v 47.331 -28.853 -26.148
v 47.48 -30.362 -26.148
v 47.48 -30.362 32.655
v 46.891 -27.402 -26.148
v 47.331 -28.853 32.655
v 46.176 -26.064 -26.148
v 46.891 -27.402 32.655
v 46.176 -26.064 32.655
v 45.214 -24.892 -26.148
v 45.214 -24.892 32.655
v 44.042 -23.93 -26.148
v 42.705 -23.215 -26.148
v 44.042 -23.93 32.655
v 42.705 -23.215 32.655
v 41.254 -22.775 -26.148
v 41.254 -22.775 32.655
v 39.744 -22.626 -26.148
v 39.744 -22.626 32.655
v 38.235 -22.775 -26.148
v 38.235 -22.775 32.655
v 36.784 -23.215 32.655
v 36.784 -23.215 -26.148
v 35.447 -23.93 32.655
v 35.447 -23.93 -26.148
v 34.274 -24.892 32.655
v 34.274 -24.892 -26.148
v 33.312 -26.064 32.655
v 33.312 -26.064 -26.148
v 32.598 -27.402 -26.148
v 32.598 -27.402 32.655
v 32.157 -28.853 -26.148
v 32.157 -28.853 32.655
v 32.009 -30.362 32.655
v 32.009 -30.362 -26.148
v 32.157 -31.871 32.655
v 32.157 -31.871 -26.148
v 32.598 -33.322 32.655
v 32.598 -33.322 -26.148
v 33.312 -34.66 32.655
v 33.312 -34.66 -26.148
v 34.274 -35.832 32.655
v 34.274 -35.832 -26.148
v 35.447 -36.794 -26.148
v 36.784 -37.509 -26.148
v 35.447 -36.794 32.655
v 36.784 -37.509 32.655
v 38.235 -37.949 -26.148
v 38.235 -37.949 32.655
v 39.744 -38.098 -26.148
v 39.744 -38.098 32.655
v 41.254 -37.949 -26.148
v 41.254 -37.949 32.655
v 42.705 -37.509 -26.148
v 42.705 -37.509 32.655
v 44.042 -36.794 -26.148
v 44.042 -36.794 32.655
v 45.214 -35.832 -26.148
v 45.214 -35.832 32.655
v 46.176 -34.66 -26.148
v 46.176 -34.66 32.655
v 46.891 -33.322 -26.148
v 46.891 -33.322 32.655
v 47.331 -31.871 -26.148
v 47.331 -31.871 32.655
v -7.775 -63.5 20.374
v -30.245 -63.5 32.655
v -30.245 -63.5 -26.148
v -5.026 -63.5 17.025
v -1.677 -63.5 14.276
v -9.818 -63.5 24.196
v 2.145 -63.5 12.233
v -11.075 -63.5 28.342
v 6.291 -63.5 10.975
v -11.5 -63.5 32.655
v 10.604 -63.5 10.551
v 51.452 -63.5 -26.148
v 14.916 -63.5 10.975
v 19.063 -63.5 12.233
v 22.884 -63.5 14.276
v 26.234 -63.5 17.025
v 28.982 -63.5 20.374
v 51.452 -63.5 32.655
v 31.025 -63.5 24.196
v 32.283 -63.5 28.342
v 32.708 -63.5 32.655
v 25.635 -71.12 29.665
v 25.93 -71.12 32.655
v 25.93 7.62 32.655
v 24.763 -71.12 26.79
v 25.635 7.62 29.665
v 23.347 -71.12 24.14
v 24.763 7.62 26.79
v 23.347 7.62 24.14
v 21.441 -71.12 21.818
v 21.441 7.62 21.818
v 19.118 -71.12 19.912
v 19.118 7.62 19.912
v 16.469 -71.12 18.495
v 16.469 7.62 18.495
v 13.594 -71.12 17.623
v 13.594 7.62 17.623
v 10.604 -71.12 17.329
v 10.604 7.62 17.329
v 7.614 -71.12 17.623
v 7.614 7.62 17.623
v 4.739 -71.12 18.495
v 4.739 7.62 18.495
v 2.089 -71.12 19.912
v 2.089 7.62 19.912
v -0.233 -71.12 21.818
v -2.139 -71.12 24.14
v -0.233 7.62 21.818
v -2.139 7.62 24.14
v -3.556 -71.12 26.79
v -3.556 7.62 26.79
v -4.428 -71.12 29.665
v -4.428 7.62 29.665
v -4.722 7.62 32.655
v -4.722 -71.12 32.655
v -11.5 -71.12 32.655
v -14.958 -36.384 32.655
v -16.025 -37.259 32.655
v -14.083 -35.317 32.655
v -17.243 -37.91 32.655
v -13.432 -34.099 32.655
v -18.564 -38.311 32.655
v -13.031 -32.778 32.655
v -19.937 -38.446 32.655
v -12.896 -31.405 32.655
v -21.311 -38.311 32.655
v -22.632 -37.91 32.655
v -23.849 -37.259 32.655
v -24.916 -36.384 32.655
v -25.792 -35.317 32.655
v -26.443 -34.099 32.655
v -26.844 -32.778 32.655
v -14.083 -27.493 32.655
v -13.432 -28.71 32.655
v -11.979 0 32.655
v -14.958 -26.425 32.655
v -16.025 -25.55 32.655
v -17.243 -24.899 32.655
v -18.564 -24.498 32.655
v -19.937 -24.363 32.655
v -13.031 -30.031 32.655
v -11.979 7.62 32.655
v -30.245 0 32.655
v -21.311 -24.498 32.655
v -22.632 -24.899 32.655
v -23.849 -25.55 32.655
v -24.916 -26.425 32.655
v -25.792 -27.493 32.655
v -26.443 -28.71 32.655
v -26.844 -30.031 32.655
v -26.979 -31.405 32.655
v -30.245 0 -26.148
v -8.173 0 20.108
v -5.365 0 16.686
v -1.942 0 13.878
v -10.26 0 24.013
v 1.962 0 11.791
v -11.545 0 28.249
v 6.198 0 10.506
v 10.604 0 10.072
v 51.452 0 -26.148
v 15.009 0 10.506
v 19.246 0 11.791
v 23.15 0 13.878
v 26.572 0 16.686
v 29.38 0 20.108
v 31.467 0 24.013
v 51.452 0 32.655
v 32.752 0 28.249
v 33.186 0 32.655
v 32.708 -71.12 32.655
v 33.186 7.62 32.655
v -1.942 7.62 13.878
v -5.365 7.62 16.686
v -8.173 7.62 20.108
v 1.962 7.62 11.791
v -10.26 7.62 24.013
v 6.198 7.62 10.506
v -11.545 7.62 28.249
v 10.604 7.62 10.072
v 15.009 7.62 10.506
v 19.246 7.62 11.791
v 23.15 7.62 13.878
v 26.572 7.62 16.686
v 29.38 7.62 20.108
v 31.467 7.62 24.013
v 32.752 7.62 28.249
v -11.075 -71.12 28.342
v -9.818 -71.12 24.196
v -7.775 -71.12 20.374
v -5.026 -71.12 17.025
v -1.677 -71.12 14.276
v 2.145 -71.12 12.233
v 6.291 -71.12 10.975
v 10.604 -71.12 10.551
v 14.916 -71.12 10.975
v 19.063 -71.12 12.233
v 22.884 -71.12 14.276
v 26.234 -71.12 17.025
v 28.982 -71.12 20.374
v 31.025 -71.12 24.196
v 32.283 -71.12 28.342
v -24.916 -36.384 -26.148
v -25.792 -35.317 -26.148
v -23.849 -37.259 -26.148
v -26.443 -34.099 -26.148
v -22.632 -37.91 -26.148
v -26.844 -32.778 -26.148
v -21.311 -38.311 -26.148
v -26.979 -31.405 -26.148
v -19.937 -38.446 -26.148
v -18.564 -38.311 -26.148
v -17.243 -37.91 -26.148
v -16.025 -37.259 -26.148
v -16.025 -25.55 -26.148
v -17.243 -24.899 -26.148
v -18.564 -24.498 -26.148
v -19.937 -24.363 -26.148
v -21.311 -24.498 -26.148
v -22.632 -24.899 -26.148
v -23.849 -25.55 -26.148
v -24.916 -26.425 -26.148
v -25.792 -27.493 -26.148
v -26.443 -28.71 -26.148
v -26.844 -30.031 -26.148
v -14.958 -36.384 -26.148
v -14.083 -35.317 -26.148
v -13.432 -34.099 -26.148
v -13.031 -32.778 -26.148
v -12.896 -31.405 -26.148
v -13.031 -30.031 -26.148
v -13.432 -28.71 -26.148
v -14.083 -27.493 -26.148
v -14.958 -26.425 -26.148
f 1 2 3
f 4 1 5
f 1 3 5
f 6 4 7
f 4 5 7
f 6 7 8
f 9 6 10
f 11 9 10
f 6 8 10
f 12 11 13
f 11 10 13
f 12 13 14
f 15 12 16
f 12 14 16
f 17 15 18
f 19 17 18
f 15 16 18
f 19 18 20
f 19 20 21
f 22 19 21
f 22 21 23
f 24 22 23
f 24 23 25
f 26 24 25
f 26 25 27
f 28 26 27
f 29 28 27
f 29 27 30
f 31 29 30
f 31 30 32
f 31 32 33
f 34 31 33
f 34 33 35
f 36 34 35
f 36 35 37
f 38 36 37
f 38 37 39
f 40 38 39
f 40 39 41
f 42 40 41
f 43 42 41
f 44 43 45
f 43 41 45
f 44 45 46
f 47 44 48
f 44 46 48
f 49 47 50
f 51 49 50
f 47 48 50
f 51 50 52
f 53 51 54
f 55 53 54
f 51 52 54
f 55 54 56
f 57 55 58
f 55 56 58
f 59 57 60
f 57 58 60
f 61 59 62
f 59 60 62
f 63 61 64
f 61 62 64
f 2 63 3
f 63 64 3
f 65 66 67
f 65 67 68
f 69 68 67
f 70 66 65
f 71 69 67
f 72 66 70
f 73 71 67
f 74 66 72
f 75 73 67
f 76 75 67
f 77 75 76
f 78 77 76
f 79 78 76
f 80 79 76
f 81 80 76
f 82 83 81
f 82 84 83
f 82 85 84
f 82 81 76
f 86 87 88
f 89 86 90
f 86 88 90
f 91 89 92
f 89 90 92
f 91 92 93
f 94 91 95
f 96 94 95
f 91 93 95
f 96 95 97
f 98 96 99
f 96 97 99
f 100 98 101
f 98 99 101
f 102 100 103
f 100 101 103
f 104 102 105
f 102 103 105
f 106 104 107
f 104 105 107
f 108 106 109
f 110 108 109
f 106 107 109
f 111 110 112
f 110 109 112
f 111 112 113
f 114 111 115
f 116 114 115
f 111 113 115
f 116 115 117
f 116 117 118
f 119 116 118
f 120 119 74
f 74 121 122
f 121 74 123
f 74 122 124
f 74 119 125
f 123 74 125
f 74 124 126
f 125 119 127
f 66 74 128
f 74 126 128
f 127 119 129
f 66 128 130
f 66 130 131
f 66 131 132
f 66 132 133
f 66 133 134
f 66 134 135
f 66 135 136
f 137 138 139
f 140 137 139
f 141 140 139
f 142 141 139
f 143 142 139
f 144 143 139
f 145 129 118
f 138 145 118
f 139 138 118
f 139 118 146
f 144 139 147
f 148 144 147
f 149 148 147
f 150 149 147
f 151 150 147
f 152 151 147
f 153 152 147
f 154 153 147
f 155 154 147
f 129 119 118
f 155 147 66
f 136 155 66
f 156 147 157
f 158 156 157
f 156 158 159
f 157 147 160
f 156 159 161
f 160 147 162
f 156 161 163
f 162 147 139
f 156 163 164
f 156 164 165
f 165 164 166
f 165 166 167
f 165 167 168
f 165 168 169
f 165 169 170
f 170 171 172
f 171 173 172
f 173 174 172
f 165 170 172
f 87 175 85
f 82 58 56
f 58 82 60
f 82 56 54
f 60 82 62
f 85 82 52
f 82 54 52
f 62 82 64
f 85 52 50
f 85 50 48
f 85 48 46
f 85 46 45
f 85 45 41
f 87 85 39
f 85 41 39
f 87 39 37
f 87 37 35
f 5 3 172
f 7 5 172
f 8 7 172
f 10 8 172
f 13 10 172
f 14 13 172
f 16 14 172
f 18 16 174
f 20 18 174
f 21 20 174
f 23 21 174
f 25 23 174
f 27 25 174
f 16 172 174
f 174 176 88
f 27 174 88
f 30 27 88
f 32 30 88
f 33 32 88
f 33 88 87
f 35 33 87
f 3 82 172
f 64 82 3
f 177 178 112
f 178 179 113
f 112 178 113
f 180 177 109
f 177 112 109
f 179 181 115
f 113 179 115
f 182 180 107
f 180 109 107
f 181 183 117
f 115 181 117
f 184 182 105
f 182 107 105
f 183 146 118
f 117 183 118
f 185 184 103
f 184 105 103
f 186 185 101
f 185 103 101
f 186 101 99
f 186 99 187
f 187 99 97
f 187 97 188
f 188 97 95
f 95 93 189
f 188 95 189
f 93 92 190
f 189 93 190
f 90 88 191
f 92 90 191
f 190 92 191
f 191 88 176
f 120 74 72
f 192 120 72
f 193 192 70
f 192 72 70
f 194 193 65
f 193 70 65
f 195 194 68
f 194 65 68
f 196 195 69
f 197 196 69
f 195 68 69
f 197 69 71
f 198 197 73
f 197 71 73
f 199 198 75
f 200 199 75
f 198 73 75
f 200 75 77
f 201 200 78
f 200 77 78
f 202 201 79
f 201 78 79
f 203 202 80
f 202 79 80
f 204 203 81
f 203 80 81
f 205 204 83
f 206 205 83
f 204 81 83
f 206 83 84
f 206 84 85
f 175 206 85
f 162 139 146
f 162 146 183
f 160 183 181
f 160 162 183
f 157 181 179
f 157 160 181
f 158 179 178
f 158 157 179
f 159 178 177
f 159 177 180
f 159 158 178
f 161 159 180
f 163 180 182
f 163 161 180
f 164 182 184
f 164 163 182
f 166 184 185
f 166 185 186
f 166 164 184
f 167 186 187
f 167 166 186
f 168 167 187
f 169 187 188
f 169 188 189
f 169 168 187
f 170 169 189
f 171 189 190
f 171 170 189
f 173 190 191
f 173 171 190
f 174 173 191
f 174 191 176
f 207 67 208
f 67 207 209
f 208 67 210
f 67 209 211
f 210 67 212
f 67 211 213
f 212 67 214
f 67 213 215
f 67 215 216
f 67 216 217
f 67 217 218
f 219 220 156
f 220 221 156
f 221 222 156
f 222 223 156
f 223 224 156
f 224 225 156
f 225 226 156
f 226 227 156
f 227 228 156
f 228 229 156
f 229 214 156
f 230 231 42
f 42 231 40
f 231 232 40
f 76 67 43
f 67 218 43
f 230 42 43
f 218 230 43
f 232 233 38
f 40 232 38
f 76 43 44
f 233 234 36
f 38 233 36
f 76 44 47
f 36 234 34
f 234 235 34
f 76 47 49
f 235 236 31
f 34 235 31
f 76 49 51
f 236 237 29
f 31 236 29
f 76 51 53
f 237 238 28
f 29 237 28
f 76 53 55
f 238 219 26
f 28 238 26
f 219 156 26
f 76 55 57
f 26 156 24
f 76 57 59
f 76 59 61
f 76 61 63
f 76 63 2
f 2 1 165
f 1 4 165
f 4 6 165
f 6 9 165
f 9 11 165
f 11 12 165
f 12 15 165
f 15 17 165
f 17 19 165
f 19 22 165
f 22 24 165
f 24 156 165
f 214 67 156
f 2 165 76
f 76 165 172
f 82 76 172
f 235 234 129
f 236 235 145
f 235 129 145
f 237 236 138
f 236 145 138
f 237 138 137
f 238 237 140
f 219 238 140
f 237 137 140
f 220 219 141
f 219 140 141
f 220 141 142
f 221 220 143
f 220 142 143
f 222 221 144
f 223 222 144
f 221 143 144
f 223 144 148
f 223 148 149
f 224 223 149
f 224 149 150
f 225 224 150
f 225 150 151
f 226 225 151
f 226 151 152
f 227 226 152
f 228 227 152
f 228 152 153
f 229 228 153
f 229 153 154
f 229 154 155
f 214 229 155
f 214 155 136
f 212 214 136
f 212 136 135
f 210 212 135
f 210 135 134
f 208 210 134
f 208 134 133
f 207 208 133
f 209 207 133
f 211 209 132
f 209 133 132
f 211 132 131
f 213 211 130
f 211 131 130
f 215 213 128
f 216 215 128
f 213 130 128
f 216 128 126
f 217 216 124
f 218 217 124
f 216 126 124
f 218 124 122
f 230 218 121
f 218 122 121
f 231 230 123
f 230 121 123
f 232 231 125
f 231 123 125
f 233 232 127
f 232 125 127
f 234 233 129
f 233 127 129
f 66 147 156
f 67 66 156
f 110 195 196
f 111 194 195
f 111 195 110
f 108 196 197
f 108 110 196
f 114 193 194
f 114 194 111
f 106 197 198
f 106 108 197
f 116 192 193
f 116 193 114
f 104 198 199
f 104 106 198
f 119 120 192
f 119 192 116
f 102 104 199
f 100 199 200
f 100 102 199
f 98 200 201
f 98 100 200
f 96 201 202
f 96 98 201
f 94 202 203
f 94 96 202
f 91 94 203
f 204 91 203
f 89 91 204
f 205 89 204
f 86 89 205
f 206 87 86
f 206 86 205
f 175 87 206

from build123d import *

# Parameters (mm, degrees)
F1_DEPTH = 63.5
F2_DEPTH = 7.62
F4_DEPTH = 7.62
F5_R     = 7.735602
F6_DEPTH = 73.152
F5_R_2   = 7.041534
F7_DEPTH = 76.2


with BuildPart() as f1:
    # F0 (on Front) → F1 (new body)
    with BuildSketch(Plane.XZ):
        with BuildLine():
            Line((-11.978863, 32.654684), (-30.244743, 32.654684))
            Line((-30.244743, 32.654684), (-30.244743, -26.147846))
            Line((-30.244743, -26.147846), (51.452216, -26.147846))
            Line((51.452216, -26.147846), (51.452216, 32.654684))
            Line((51.452216, 32.654684), (33.186335, 32.654684))
            ThreePointArc((33.186335, 32.654684), (10.603736, 10.072085), (-11.978863, 32.654684))
        make_face()
        with BuildLine():
            Line((-4.722234, 32.654684), (-11.978863, 32.654684))
            ThreePointArc((-11.978863, 32.654684), (10.603736, 10.072085), (33.186335, 32.654684))
            Line((33.186335, 32.654684), (25.929707, 32.654684))
            ThreePointArc((25.929707, 32.654684), (10.603736, 17.328714), (-4.722234, 32.654684))
        make_face()
    extrude(amount=F1_DEPTH)

    # F0 (on Front) → F2 (join)
    with BuildSketch(Plane.XZ):
        with BuildLine():
            Line((-4.722234, 32.654684), (-11.978863, 32.654684))
            ThreePointArc((-11.978863, 32.654684), (10.603736, 10.072085), (33.186335, 32.654684))
            Line((33.186335, 32.654684), (25.929707, 32.654684))
            ThreePointArc((25.929707, 32.654684), (10.603736, 17.328714), (-4.722234, 32.654684))
        make_face()
    extrude(amount=-F2_DEPTH)

    # F3 (on face) → F4 (join)
    with BuildSketch(Plane.XZ.offset(63.5)):
        with BuildLine():
            ThreePointArc((-11.5002, 32.654684), (10.603736, 10.550748), (32.707673, 32.654684))
            Line((32.707673, 32.654684), (25.929707, 32.654684))
            ThreePointArc((25.929707, 32.654684), (10.603736, 17.328714), (-4.722234, 32.654684))
            Line((-4.722234, 32.654684), (-11.5002, 32.654684))
        make_face()
    extrude(amount=F4_DEPTH)

    # F5 (on face) → F6 (cut)
    with BuildSketch(Plane.XY.offset(32.654684)):
        with Locations((39.744381, -30.362099)):
            Circle(F5_R)
    extrude(amount=-F6_DEPTH, mode=Mode.SUBTRACT)

    # F5 (on face) → F7 (cut)
    with BuildSketch(Plane.XY.offset(32.654684)):
        with Locations((-19.937346, -31.404577)):
            Circle(F5_R_2)
        with Locations((39.744381, -30.362099)):
            Circle(F5_R)
    extrude(amount=-F7_DEPTH, mode=Mode.SUBTRACT)


solid = f1.part
